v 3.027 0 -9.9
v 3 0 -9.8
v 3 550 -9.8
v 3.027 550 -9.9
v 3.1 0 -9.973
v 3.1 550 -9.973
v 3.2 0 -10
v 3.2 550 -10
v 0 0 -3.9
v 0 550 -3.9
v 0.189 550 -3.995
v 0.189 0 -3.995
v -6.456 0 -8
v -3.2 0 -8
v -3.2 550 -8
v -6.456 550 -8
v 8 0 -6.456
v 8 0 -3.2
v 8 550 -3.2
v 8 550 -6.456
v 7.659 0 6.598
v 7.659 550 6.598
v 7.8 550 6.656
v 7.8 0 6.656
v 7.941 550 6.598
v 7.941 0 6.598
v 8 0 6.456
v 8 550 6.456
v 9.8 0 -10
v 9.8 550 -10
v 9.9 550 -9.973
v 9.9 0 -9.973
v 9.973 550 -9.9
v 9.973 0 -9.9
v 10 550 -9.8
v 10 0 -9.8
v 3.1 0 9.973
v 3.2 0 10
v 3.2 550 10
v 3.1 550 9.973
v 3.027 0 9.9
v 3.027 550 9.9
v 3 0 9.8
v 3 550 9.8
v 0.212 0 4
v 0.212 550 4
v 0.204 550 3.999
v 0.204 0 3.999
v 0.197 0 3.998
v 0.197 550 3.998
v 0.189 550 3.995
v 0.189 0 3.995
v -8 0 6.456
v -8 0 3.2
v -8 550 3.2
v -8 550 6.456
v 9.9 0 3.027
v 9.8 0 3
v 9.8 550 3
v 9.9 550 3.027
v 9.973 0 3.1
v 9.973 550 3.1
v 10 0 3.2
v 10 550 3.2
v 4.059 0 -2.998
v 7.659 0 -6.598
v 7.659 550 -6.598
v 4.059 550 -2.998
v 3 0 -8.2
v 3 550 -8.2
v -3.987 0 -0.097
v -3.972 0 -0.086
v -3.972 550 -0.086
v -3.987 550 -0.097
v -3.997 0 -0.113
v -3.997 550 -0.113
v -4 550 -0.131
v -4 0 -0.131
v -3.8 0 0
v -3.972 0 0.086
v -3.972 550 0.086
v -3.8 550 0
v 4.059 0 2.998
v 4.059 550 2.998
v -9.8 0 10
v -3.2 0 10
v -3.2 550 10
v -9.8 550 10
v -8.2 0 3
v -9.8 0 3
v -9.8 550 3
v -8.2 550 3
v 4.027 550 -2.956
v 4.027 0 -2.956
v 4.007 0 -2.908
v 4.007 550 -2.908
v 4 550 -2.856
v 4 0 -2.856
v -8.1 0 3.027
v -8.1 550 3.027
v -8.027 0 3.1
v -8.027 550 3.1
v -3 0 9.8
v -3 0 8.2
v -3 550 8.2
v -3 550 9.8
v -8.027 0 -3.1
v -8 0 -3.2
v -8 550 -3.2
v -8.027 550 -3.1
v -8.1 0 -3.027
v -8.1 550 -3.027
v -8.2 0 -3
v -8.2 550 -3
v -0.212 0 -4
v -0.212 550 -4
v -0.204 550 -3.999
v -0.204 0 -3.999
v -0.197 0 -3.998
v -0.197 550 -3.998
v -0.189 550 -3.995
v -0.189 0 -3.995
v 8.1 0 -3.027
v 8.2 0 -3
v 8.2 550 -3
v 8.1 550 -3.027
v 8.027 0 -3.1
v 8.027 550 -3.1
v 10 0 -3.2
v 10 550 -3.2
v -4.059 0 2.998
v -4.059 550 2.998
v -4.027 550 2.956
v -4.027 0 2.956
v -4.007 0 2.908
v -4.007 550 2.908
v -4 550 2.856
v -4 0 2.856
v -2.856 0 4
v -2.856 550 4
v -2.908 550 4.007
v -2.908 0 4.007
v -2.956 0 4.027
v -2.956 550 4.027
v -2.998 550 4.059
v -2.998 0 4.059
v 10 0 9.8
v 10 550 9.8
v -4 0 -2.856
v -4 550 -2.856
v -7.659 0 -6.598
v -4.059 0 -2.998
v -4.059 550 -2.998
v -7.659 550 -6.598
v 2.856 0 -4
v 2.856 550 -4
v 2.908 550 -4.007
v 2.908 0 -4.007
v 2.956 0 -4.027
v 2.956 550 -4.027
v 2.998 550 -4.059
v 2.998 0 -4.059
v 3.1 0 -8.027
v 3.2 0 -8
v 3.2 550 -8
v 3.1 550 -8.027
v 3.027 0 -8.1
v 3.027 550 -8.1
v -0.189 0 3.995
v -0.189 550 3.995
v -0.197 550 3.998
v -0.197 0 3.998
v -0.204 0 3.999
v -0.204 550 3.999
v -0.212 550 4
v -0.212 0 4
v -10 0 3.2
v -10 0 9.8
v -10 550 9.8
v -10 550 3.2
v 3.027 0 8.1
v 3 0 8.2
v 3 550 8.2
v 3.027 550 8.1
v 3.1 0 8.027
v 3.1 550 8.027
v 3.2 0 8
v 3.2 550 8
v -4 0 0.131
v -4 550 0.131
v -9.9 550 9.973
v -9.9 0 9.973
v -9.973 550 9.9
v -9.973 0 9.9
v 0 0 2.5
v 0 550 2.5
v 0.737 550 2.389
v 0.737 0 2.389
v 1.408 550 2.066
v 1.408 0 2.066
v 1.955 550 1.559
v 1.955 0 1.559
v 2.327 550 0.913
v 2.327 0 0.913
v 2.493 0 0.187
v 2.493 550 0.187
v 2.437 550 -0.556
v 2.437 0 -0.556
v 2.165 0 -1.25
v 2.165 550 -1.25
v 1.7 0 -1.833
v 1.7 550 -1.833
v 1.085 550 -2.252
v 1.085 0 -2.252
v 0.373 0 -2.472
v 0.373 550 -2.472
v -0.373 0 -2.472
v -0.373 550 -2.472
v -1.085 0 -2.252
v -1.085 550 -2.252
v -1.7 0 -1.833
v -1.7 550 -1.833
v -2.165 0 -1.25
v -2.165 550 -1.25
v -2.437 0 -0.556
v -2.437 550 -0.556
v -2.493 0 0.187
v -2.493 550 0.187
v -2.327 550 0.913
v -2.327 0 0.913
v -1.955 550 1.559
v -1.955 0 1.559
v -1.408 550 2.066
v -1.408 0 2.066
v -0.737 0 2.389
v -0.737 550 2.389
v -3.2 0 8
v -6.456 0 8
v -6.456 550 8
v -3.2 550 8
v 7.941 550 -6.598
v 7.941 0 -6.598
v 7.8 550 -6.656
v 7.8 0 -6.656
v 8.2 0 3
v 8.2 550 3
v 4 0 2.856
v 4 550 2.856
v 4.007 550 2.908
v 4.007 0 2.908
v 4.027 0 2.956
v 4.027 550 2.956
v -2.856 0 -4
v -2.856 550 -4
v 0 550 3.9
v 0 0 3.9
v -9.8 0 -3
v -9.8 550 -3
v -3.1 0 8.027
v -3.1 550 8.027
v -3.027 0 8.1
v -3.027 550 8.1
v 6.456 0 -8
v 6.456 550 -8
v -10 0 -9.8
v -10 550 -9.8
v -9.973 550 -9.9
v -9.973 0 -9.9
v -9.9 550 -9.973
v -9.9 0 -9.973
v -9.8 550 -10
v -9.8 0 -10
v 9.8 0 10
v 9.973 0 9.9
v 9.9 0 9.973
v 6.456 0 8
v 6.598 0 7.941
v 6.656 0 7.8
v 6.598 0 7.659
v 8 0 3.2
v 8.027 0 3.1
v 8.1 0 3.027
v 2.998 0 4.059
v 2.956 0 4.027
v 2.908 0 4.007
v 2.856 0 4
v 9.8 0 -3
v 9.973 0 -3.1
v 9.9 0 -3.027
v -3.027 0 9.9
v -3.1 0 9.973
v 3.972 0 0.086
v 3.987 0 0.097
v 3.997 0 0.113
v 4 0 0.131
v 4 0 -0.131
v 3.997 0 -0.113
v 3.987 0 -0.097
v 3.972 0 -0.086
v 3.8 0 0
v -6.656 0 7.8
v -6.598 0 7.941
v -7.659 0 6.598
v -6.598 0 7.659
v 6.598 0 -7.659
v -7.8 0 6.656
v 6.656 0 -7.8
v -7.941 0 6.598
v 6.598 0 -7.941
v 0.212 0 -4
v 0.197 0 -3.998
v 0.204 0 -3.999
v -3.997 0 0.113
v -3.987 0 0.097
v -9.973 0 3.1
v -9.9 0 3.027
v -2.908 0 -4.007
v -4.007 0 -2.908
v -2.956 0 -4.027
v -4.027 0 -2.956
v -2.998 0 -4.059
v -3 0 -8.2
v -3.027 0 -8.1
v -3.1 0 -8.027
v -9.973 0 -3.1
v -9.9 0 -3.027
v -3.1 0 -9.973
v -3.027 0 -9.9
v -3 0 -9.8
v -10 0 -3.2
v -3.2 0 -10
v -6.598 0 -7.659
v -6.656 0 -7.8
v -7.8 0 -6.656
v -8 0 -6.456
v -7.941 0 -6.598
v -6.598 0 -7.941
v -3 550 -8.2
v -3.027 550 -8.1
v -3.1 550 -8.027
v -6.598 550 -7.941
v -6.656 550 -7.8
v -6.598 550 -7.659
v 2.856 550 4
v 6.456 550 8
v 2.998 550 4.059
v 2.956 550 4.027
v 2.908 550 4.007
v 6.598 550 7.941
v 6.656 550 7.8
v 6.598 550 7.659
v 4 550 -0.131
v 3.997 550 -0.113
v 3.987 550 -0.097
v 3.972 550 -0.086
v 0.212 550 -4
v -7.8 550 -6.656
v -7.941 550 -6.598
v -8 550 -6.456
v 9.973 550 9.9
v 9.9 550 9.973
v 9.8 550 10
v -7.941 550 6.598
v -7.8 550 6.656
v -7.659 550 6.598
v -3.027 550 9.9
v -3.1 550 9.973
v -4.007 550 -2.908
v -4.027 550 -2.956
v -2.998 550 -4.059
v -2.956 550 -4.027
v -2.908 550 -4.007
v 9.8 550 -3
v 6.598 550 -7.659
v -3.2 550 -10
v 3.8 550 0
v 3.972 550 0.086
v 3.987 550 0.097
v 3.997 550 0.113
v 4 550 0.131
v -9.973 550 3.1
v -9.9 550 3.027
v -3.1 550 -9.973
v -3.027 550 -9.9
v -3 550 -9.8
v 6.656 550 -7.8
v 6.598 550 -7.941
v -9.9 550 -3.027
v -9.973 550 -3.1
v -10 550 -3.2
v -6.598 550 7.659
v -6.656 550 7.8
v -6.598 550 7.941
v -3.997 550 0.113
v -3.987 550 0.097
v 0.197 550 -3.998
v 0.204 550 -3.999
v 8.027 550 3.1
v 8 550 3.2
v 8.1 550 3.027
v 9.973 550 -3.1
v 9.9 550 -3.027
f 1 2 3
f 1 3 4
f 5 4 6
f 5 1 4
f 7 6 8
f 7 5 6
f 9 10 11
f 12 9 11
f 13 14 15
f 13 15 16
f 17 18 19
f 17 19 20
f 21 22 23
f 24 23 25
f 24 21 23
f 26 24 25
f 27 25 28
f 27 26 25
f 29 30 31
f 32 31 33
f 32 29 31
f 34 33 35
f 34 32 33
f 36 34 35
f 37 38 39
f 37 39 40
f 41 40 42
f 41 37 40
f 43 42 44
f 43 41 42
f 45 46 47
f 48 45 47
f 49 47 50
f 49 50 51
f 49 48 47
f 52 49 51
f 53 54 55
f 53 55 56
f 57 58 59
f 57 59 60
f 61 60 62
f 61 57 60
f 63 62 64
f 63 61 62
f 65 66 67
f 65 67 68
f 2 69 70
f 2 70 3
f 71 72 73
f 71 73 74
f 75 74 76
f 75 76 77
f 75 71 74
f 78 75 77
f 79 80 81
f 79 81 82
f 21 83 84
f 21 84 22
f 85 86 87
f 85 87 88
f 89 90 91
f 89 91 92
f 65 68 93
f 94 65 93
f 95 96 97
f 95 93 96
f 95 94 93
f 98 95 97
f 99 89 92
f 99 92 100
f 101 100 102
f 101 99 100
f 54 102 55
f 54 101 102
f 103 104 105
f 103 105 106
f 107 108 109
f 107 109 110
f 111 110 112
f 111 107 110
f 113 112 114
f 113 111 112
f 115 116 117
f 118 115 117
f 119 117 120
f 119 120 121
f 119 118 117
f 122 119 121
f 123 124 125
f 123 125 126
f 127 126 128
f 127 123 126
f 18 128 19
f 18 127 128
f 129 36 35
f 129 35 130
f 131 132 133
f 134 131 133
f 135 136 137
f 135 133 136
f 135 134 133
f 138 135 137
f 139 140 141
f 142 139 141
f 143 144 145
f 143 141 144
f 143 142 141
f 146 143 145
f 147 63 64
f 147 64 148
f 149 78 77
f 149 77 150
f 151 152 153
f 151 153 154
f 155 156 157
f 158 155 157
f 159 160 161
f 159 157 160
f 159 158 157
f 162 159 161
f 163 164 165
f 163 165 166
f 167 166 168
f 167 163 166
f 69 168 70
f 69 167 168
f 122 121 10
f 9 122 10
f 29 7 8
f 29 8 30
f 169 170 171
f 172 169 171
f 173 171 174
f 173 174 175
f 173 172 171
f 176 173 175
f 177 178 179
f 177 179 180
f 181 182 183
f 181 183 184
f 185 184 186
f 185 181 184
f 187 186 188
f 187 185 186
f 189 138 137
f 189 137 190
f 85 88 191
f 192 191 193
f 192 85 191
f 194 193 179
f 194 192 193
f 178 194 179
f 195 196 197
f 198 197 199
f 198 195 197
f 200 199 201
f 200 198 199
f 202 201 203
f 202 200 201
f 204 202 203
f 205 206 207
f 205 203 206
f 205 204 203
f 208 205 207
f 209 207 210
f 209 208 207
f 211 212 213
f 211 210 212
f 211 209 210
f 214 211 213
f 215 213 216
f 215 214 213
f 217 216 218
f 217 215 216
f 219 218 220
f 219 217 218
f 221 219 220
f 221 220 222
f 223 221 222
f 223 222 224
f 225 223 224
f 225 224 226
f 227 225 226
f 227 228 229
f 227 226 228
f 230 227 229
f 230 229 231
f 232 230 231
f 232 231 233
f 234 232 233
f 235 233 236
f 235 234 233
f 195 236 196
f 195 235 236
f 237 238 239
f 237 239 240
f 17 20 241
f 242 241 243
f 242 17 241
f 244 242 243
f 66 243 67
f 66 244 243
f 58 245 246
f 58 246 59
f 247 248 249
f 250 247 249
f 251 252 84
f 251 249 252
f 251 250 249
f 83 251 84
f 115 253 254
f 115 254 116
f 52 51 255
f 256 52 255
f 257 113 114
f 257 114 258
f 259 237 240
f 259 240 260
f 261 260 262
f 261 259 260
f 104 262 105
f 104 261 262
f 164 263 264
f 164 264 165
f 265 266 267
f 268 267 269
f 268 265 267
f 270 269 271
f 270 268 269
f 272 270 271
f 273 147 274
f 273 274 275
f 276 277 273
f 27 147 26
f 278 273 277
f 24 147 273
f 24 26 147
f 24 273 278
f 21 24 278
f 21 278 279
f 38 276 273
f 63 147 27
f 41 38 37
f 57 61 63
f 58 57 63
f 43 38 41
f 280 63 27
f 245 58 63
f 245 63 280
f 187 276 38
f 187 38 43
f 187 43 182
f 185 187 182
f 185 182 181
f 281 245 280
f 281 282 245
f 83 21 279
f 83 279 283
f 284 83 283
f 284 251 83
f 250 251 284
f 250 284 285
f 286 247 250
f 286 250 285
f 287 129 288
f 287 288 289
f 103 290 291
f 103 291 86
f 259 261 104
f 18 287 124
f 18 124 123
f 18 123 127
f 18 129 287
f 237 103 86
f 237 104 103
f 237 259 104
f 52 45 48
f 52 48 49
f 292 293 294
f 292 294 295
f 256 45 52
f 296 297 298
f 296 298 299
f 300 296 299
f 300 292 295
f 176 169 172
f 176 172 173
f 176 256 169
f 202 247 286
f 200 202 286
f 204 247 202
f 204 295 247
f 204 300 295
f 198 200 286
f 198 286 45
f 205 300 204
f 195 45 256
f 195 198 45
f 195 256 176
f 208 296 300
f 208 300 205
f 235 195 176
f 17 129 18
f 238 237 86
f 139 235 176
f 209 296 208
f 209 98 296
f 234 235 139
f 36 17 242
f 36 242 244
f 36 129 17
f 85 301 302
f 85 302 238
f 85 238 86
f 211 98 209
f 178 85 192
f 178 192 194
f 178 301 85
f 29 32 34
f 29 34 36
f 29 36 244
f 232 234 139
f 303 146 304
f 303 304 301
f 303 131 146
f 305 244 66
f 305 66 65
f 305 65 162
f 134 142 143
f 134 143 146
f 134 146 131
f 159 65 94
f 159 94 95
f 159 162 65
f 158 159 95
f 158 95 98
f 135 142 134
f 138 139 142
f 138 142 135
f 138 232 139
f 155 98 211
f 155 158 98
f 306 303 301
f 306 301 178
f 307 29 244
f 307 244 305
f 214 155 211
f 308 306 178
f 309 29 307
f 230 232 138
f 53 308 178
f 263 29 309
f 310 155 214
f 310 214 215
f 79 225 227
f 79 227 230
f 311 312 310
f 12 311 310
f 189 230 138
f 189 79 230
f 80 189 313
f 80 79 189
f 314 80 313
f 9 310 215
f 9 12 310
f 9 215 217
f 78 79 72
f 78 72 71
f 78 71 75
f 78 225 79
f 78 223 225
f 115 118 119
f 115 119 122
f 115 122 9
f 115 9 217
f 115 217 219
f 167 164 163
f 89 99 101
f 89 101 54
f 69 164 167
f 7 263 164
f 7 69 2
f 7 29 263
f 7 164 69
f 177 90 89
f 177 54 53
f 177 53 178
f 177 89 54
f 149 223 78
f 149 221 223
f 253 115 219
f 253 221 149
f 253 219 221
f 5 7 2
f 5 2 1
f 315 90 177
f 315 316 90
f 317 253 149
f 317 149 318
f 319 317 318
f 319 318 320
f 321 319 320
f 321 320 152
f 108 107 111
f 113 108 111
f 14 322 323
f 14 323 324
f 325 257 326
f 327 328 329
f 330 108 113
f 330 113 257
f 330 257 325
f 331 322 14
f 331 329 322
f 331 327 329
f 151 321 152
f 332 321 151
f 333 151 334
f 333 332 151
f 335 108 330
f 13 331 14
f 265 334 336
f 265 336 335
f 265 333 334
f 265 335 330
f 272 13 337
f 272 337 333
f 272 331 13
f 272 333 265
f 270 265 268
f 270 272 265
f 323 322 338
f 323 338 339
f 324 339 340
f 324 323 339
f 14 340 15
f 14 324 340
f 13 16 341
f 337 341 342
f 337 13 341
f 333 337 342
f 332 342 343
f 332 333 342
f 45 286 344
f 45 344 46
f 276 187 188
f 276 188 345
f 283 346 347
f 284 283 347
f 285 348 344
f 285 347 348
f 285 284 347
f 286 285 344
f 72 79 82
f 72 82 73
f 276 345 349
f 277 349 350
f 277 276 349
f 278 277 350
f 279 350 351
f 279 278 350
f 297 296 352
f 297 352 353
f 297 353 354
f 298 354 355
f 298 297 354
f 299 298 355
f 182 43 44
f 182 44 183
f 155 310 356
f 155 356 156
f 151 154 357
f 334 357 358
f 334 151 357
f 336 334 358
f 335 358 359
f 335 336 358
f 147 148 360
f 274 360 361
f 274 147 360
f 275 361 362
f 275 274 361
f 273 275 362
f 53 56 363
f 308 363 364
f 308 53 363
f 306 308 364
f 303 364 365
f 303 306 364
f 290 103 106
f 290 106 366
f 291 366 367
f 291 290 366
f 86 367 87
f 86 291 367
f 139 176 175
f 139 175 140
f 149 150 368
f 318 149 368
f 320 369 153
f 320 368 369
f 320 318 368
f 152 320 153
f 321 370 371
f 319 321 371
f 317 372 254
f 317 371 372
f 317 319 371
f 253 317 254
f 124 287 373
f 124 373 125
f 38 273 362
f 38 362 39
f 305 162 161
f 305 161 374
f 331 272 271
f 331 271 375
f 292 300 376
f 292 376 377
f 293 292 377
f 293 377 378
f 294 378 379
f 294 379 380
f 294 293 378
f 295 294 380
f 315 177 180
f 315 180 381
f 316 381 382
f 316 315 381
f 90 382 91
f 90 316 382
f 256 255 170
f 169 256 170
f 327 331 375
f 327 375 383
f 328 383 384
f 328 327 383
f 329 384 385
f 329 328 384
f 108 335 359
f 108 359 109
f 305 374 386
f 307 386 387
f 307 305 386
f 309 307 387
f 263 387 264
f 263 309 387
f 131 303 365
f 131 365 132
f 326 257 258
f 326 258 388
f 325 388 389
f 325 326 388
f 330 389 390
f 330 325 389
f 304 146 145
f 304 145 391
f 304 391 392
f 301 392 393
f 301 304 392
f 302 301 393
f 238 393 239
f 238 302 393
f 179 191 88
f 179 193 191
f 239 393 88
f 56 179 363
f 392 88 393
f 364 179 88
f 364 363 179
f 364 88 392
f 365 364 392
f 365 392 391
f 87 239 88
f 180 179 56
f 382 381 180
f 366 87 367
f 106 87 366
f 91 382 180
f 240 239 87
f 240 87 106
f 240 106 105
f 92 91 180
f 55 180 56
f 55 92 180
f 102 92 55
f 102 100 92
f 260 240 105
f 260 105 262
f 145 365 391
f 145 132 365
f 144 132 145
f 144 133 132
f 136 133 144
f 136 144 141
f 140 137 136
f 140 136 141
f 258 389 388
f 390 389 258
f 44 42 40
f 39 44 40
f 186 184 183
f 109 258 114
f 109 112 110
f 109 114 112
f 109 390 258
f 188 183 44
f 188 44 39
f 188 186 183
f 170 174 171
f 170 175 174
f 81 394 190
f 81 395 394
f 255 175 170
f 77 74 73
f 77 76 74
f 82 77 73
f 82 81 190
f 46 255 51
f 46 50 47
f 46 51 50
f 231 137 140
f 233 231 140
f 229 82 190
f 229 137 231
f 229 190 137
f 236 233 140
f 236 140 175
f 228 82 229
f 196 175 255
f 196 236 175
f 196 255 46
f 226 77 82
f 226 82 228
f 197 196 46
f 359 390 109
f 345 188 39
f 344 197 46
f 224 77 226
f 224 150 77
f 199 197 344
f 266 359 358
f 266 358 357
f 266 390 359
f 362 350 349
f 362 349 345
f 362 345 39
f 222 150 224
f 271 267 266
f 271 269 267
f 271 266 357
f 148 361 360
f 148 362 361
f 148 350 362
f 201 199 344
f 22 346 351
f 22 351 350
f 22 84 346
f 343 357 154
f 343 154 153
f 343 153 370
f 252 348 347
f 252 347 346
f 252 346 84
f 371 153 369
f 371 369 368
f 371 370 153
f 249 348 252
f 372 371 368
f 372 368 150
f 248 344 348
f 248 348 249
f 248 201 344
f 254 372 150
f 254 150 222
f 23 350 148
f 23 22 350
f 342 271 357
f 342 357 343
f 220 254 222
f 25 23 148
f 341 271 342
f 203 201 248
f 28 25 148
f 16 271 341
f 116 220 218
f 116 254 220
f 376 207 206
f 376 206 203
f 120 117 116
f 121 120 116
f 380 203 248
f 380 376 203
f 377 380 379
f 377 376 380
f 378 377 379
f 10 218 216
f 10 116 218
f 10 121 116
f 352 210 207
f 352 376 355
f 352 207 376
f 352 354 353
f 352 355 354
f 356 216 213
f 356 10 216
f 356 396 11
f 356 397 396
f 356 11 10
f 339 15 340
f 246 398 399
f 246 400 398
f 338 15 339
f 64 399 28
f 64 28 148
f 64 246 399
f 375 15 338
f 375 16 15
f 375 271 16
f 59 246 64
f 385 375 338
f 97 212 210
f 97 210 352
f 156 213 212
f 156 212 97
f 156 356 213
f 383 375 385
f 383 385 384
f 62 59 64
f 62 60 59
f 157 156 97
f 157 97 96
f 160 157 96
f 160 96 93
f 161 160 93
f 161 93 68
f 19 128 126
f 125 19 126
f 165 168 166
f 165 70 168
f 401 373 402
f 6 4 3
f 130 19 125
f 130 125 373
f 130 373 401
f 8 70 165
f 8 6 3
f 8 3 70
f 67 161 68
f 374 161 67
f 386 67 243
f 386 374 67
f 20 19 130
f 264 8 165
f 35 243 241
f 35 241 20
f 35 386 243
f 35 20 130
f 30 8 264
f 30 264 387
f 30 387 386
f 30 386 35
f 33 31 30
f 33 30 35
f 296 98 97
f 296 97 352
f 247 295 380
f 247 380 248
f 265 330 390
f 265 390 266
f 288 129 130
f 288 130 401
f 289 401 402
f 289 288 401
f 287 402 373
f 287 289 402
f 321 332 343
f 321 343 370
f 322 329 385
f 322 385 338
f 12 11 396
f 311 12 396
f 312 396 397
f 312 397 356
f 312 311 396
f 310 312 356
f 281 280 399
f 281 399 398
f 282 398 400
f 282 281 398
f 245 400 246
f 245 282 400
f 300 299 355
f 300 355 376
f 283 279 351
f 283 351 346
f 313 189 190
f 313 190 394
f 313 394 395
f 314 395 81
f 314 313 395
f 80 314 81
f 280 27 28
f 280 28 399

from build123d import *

# Parameters (mm, degrees)
SKETCH1_R           = 2.5
BOSS_EXTRUDE1_DEPTH = 700
SKETCH3_W           = 24.985840616
SKETCH3_H           = 22.156024638
CUT_EXTRUDE2_DEPTH  = 150


with BuildPart() as part:
    # Sketch1 → Boss-Extrude1 (new body)
    with BuildSketch(Plane(origin=(0, 0, 0), x_dir=(1, 0, 0), z_dir=(0, 1, 0))):
        with BuildLine():
            Line((-2.997918472, 4.058578644), (-6.597918472, 7.658578644))
            ThreePointArc((-6.597918472, 7.658578644), (-6.621415508, 7.686854412), (-6.639339828, 7.718953455))
            ThreePointArc((-6.639339828, 7.718953455), (-6.656497116, 7.8), (-6.639339828, 7.881046545))
            ThreePointArc((-6.639339828, 7.881046545), (-6.565562901, 7.967644429), (-6.456497116, 8))
            Line((-6.456497116, 8), (-3.2, 8))
            ThreePointArc((-3.2, 8), (-3.058578644, 8.058578644), (-3, 8.2))
            Line((-3, 8.2), (-3, 9.8))
            ThreePointArc((-3, 9.8), (-3.058578644, 9.941421356), (-3.2, 10))
            Line((-3.2, 10), (-9.8, 10))
            ThreePointArc((-9.8, 10), (-9.941421356, 9.941421356), (-10, 9.8))
            Line((-10, 9.8), (-10, 3.2))
            ThreePointArc((-10, 3.2), (-9.941421356, 3.058578644), (-9.8, 3))
            Line((-9.8, 3), (-8.2, 3))
            ThreePointArc((-8.2, 3), (-8.058578644, 3.058578644), (-8, 3.2))
            Line((-8, 3.2), (-8, 6.456497116))
            ThreePointArc((-8, 6.456497116), (-7.967644429, 6.565562901), (-7.881046545, 6.639339828))
            ThreePointArc((-7.881046545, 6.639339828), (-7.8, 6.656497116), (-7.718953455, 6.639339828))
            ThreePointArc((-7.718953455, 6.639339828), (-7.686854412, 6.621415508), (-7.658578644, 6.597918472))
            Line((-7.658578644, 6.597918472), (-4.058578644, 2.997918472))
            ThreePointArc((-4.058578644, 2.997918472), (-4.015224093, 2.933033802), (-4, 2.856497116))
            Line((-4, 2.856497116), (-4, 0.130901699))
            ThreePointArc((-4, 0.130901699), (-3.99253254, 0.104615144), (-3.97236068, 0.08618034))
            Line((-3.97236068, 0.08618034), (-3.8, 0))
            Line((-3.8, 0), (-3.97236068, -0.08618034))
            ThreePointArc((-3.97236068, -0.08618034), (-3.99253254, -0.104615144), (-4, -0.130901699))
            Line((-4, -0.130901699), (-4, -2.856497116))
            ThreePointArc((-4, -2.856497116), (-4.015224093, -2.933033802), (-4.058578644, -2.997918472))
            Line((-4.058578644, -2.997918472), (-7.658578644, -6.597918472))
            ThreePointArc((-7.658578644, -6.597918472), (-7.686854412, -6.621415508), (-7.718953455, -6.639339828))
            ThreePointArc((-7.718953455, -6.639339828), (-7.8, -6.656497116), (-7.881046545, -6.639339828))
            ThreePointArc((-7.881046545, -6.639339828), (-7.967644429, -6.565562901), (-8, -6.456497116))
            Line((-8, -6.456497116), (-8, -3.2))
            ThreePointArc((-8, -3.2), (-8.058578644, -3.058578644), (-8.2, -3))
            Line((-8.2, -3), (-9.8, -3))
            ThreePointArc((-9.8, -3), (-9.941421356, -3.058578644), (-10, -3.2))
            Line((-10, -3.2), (-10, -9.8))
            ThreePointArc((-10, -9.8), (-9.941421356, -9.941421356), (-9.8, -10))
            Line((-9.8, -10), (-3.2, -10))
            ThreePointArc((-3.2, -10), (-3.058578644, -9.941421356), (-3, -9.8))
            Line((-3, -9.8), (-3, -8.2))
            ThreePointArc((-3, -8.2), (-3.058578644, -8.058578644), (-3.2, -8))
            Line((-3.2, -8), (-6.456497116, -8))
            ThreePointArc((-6.456497116, -8), (-6.565562901, -7.967644429), (-6.639339828, -7.881046545))
            ThreePointArc((-6.639339828, -7.881046545), (-6.656497116, -7.8), (-6.639339828, -7.718953455))
            ThreePointArc((-6.639339828, -7.718953455), (-6.621415508, -7.686854412), (-6.597918472, -7.658578644))
            Line((-6.597918472, -7.658578644), (-2.997918472, -4.058578644))
            ThreePointArc((-2.997918472, -4.058578644), (-2.933033802, -4.015224093), (-2.856497116, -4))
            Line((-2.856497116, -4), (-0.211803399, -4))
            ThreePointArc((-0.211803399, -4), (-0.200315753, -3.998662449), (-0.189442719, -3.99472136))
            Line((-0.189442719, -3.99472136), (0, -3.9))
            Line((0, -3.9), (0.189442719, -3.99472136))
            ThreePointArc((0.189442719, -3.99472136), (0.200315753, -3.998662449), (0.211803399, -4))
            Line((0.211803399, -4), (2.856497116, -4))
            ThreePointArc((2.856497116, -4), (2.933033802, -4.015224093), (2.997918472, -4.058578644))
            Line((2.997918472, -4.058578644), (6.597918472, -7.658578644))
            ThreePointArc((6.597918472, -7.658578644), (6.621415508, -7.686854412), (6.639339828, -7.718953455))
            ThreePointArc((6.639339828, -7.718953455), (6.656497116, -7.8), (6.639339828, -7.881046545))
            ThreePointArc((6.639339828, -7.881046545), (6.565562901, -7.967644429), (6.456497116, -8))
            Line((6.456497116, -8), (3.2, -8))
            ThreePointArc((3.2, -8), (3.058578644, -8.058578644), (3, -8.2))
            Line((3, -8.2), (3, -9.8))
            ThreePointArc((3, -9.8), (3.058578644, -9.941421356), (3.2, -10))
            Line((3.2, -10), (9.8, -10))
            ThreePointArc((9.8, -10), (9.941421356, -9.941421356), (10, -9.8))
            Line((10, -9.8), (10, -3.2))
            ThreePointArc((10, -3.2), (9.941421356, -3.058578644), (9.8, -3))
            Line((9.8, -3), (8.2, -3))
            ThreePointArc((8.2, -3), (8.058578644, -3.058578644), (8, -3.2))
            Line((8, -3.2), (8, -6.456497116))
            ThreePointArc((8, -6.456497116), (7.967644429, -6.565562901), (7.881046545, -6.639339828))
            ThreePointArc((7.881046545, -6.639339828), (7.8, -6.656497116), (7.718953455, -6.639339828))
            ThreePointArc((7.718953455, -6.639339828), (7.686854412, -6.621415508), (7.658578644, -6.597918472))
            Line((7.658578644, -6.597918472), (4.058578644, -2.997918472))
            ThreePointArc((4.058578644, -2.997918472), (4.015224093, -2.933033802), (4, -2.856497116))
            Line((4, -2.856497116), (4, -0.130901699))
            ThreePointArc((4, -0.130901699), (3.99253254, -0.104615144), (3.97236068, -0.08618034))
            Line((3.97236068, -0.08618034), (3.8, 0))
            Line((3.8, 0), (3.97236068, 0.08618034))
            ThreePointArc((3.97236068, 0.08618034), (3.99253254, 0.104615144), (4, 0.130901699))
            Line((4, 0.130901699), (4, 2.856497116))
            ThreePointArc((4, 2.856497116), (4.015224093, 2.933033802), (4.058578644, 2.997918472))
            Line((4.058578644, 2.997918472), (7.658578644, 6.597918472))
            ThreePointArc((7.658578644, 6.597918472), (7.686854412, 6.621415508), (7.718953455, 6.639339828))
            ThreePointArc((7.718953455, 6.639339828), (7.8, 6.656497116), (7.881046545, 6.639339828))
            ThreePointArc((7.881046545, 6.639339828), (7.967644429, 6.565562901), (8, 6.456497116))
            Line((8, 6.456497116), (8, 3.2))
            ThreePointArc((8, 3.2), (8.058578644, 3.058578644), (8.2, 3))
            Line((8.2, 3), (9.8, 3))
            ThreePointArc((9.8, 3), (9.941421356, 3.058578644), (10, 3.2))
            Line((10, 3.2), (10, 9.8))
            ThreePointArc((10, 9.8), (9.941421356, 9.941421356), (9.8, 10))
            Line((9.8, 10), (3.2, 10))
            ThreePointArc((3.2, 10), (3.058578644, 9.941421356), (3, 9.8))
            Line((3, 9.8), (3, 8.2))
            ThreePointArc((3, 8.2), (3.058578644, 8.058578644), (3.2, 8))
            Line((3.2, 8), (6.456497116, 8))
            ThreePointArc((6.456497116, 8), (6.565562901, 7.967644429), (6.639339828, 7.881046545))
            ThreePointArc((6.639339828, 7.881046545), (6.656497116, 7.8), (6.639339828, 7.718953455))
            ThreePointArc((6.639339828, 7.718953455), (6.621415508, 7.686854412), (6.597918472, 7.658578644))
            Line((6.597918472, 7.658578644), (2.997918472, 4.058578644))
            ThreePointArc((2.997918472, 4.058578644), (2.933033802, 4.015224093), (2.856497116, 4))
            Line((2.856497116, 4), (0.211803399, 4))
            ThreePointArc((0.211803399, 4), (0.200315753, 3.998662449), (0.189442719, 3.99472136))
            Line((0.189442719, 3.99472136), (0, 3.9))
            Line((0, 3.9), (-0.189442719, 3.99472136))
            ThreePointArc((-0.189442719, 3.99472136), (-0.200315753, 3.998662449), (-0.211803399, 4))
            Line((-0.211803399, 4), (-2.856497116, 4))
            ThreePointArc((-2.856497116, 4), (-2.933033802, 4.015224093), (-2.997918472, 4.058578644))
        make_face()
        Circle(SKETCH1_R, mode=Mode.SUBTRACT)
    extrude(amount=BOSS_EXTRUDE1_DEPTH)

    # Sketch3 → Cut-Extrude2 (cut)
    with BuildSketch(Plane(origin=(0, 700, 0), x_dir=(1, 0, 0), z_dir=(0, 1, 0))):
        Rectangle(SKETCH3_W, SKETCH3_H)
    extrude(amount=-CUT_EXTRUDE2_DEPTH, mode=Mode.SUBTRACT)


solid = part.part
